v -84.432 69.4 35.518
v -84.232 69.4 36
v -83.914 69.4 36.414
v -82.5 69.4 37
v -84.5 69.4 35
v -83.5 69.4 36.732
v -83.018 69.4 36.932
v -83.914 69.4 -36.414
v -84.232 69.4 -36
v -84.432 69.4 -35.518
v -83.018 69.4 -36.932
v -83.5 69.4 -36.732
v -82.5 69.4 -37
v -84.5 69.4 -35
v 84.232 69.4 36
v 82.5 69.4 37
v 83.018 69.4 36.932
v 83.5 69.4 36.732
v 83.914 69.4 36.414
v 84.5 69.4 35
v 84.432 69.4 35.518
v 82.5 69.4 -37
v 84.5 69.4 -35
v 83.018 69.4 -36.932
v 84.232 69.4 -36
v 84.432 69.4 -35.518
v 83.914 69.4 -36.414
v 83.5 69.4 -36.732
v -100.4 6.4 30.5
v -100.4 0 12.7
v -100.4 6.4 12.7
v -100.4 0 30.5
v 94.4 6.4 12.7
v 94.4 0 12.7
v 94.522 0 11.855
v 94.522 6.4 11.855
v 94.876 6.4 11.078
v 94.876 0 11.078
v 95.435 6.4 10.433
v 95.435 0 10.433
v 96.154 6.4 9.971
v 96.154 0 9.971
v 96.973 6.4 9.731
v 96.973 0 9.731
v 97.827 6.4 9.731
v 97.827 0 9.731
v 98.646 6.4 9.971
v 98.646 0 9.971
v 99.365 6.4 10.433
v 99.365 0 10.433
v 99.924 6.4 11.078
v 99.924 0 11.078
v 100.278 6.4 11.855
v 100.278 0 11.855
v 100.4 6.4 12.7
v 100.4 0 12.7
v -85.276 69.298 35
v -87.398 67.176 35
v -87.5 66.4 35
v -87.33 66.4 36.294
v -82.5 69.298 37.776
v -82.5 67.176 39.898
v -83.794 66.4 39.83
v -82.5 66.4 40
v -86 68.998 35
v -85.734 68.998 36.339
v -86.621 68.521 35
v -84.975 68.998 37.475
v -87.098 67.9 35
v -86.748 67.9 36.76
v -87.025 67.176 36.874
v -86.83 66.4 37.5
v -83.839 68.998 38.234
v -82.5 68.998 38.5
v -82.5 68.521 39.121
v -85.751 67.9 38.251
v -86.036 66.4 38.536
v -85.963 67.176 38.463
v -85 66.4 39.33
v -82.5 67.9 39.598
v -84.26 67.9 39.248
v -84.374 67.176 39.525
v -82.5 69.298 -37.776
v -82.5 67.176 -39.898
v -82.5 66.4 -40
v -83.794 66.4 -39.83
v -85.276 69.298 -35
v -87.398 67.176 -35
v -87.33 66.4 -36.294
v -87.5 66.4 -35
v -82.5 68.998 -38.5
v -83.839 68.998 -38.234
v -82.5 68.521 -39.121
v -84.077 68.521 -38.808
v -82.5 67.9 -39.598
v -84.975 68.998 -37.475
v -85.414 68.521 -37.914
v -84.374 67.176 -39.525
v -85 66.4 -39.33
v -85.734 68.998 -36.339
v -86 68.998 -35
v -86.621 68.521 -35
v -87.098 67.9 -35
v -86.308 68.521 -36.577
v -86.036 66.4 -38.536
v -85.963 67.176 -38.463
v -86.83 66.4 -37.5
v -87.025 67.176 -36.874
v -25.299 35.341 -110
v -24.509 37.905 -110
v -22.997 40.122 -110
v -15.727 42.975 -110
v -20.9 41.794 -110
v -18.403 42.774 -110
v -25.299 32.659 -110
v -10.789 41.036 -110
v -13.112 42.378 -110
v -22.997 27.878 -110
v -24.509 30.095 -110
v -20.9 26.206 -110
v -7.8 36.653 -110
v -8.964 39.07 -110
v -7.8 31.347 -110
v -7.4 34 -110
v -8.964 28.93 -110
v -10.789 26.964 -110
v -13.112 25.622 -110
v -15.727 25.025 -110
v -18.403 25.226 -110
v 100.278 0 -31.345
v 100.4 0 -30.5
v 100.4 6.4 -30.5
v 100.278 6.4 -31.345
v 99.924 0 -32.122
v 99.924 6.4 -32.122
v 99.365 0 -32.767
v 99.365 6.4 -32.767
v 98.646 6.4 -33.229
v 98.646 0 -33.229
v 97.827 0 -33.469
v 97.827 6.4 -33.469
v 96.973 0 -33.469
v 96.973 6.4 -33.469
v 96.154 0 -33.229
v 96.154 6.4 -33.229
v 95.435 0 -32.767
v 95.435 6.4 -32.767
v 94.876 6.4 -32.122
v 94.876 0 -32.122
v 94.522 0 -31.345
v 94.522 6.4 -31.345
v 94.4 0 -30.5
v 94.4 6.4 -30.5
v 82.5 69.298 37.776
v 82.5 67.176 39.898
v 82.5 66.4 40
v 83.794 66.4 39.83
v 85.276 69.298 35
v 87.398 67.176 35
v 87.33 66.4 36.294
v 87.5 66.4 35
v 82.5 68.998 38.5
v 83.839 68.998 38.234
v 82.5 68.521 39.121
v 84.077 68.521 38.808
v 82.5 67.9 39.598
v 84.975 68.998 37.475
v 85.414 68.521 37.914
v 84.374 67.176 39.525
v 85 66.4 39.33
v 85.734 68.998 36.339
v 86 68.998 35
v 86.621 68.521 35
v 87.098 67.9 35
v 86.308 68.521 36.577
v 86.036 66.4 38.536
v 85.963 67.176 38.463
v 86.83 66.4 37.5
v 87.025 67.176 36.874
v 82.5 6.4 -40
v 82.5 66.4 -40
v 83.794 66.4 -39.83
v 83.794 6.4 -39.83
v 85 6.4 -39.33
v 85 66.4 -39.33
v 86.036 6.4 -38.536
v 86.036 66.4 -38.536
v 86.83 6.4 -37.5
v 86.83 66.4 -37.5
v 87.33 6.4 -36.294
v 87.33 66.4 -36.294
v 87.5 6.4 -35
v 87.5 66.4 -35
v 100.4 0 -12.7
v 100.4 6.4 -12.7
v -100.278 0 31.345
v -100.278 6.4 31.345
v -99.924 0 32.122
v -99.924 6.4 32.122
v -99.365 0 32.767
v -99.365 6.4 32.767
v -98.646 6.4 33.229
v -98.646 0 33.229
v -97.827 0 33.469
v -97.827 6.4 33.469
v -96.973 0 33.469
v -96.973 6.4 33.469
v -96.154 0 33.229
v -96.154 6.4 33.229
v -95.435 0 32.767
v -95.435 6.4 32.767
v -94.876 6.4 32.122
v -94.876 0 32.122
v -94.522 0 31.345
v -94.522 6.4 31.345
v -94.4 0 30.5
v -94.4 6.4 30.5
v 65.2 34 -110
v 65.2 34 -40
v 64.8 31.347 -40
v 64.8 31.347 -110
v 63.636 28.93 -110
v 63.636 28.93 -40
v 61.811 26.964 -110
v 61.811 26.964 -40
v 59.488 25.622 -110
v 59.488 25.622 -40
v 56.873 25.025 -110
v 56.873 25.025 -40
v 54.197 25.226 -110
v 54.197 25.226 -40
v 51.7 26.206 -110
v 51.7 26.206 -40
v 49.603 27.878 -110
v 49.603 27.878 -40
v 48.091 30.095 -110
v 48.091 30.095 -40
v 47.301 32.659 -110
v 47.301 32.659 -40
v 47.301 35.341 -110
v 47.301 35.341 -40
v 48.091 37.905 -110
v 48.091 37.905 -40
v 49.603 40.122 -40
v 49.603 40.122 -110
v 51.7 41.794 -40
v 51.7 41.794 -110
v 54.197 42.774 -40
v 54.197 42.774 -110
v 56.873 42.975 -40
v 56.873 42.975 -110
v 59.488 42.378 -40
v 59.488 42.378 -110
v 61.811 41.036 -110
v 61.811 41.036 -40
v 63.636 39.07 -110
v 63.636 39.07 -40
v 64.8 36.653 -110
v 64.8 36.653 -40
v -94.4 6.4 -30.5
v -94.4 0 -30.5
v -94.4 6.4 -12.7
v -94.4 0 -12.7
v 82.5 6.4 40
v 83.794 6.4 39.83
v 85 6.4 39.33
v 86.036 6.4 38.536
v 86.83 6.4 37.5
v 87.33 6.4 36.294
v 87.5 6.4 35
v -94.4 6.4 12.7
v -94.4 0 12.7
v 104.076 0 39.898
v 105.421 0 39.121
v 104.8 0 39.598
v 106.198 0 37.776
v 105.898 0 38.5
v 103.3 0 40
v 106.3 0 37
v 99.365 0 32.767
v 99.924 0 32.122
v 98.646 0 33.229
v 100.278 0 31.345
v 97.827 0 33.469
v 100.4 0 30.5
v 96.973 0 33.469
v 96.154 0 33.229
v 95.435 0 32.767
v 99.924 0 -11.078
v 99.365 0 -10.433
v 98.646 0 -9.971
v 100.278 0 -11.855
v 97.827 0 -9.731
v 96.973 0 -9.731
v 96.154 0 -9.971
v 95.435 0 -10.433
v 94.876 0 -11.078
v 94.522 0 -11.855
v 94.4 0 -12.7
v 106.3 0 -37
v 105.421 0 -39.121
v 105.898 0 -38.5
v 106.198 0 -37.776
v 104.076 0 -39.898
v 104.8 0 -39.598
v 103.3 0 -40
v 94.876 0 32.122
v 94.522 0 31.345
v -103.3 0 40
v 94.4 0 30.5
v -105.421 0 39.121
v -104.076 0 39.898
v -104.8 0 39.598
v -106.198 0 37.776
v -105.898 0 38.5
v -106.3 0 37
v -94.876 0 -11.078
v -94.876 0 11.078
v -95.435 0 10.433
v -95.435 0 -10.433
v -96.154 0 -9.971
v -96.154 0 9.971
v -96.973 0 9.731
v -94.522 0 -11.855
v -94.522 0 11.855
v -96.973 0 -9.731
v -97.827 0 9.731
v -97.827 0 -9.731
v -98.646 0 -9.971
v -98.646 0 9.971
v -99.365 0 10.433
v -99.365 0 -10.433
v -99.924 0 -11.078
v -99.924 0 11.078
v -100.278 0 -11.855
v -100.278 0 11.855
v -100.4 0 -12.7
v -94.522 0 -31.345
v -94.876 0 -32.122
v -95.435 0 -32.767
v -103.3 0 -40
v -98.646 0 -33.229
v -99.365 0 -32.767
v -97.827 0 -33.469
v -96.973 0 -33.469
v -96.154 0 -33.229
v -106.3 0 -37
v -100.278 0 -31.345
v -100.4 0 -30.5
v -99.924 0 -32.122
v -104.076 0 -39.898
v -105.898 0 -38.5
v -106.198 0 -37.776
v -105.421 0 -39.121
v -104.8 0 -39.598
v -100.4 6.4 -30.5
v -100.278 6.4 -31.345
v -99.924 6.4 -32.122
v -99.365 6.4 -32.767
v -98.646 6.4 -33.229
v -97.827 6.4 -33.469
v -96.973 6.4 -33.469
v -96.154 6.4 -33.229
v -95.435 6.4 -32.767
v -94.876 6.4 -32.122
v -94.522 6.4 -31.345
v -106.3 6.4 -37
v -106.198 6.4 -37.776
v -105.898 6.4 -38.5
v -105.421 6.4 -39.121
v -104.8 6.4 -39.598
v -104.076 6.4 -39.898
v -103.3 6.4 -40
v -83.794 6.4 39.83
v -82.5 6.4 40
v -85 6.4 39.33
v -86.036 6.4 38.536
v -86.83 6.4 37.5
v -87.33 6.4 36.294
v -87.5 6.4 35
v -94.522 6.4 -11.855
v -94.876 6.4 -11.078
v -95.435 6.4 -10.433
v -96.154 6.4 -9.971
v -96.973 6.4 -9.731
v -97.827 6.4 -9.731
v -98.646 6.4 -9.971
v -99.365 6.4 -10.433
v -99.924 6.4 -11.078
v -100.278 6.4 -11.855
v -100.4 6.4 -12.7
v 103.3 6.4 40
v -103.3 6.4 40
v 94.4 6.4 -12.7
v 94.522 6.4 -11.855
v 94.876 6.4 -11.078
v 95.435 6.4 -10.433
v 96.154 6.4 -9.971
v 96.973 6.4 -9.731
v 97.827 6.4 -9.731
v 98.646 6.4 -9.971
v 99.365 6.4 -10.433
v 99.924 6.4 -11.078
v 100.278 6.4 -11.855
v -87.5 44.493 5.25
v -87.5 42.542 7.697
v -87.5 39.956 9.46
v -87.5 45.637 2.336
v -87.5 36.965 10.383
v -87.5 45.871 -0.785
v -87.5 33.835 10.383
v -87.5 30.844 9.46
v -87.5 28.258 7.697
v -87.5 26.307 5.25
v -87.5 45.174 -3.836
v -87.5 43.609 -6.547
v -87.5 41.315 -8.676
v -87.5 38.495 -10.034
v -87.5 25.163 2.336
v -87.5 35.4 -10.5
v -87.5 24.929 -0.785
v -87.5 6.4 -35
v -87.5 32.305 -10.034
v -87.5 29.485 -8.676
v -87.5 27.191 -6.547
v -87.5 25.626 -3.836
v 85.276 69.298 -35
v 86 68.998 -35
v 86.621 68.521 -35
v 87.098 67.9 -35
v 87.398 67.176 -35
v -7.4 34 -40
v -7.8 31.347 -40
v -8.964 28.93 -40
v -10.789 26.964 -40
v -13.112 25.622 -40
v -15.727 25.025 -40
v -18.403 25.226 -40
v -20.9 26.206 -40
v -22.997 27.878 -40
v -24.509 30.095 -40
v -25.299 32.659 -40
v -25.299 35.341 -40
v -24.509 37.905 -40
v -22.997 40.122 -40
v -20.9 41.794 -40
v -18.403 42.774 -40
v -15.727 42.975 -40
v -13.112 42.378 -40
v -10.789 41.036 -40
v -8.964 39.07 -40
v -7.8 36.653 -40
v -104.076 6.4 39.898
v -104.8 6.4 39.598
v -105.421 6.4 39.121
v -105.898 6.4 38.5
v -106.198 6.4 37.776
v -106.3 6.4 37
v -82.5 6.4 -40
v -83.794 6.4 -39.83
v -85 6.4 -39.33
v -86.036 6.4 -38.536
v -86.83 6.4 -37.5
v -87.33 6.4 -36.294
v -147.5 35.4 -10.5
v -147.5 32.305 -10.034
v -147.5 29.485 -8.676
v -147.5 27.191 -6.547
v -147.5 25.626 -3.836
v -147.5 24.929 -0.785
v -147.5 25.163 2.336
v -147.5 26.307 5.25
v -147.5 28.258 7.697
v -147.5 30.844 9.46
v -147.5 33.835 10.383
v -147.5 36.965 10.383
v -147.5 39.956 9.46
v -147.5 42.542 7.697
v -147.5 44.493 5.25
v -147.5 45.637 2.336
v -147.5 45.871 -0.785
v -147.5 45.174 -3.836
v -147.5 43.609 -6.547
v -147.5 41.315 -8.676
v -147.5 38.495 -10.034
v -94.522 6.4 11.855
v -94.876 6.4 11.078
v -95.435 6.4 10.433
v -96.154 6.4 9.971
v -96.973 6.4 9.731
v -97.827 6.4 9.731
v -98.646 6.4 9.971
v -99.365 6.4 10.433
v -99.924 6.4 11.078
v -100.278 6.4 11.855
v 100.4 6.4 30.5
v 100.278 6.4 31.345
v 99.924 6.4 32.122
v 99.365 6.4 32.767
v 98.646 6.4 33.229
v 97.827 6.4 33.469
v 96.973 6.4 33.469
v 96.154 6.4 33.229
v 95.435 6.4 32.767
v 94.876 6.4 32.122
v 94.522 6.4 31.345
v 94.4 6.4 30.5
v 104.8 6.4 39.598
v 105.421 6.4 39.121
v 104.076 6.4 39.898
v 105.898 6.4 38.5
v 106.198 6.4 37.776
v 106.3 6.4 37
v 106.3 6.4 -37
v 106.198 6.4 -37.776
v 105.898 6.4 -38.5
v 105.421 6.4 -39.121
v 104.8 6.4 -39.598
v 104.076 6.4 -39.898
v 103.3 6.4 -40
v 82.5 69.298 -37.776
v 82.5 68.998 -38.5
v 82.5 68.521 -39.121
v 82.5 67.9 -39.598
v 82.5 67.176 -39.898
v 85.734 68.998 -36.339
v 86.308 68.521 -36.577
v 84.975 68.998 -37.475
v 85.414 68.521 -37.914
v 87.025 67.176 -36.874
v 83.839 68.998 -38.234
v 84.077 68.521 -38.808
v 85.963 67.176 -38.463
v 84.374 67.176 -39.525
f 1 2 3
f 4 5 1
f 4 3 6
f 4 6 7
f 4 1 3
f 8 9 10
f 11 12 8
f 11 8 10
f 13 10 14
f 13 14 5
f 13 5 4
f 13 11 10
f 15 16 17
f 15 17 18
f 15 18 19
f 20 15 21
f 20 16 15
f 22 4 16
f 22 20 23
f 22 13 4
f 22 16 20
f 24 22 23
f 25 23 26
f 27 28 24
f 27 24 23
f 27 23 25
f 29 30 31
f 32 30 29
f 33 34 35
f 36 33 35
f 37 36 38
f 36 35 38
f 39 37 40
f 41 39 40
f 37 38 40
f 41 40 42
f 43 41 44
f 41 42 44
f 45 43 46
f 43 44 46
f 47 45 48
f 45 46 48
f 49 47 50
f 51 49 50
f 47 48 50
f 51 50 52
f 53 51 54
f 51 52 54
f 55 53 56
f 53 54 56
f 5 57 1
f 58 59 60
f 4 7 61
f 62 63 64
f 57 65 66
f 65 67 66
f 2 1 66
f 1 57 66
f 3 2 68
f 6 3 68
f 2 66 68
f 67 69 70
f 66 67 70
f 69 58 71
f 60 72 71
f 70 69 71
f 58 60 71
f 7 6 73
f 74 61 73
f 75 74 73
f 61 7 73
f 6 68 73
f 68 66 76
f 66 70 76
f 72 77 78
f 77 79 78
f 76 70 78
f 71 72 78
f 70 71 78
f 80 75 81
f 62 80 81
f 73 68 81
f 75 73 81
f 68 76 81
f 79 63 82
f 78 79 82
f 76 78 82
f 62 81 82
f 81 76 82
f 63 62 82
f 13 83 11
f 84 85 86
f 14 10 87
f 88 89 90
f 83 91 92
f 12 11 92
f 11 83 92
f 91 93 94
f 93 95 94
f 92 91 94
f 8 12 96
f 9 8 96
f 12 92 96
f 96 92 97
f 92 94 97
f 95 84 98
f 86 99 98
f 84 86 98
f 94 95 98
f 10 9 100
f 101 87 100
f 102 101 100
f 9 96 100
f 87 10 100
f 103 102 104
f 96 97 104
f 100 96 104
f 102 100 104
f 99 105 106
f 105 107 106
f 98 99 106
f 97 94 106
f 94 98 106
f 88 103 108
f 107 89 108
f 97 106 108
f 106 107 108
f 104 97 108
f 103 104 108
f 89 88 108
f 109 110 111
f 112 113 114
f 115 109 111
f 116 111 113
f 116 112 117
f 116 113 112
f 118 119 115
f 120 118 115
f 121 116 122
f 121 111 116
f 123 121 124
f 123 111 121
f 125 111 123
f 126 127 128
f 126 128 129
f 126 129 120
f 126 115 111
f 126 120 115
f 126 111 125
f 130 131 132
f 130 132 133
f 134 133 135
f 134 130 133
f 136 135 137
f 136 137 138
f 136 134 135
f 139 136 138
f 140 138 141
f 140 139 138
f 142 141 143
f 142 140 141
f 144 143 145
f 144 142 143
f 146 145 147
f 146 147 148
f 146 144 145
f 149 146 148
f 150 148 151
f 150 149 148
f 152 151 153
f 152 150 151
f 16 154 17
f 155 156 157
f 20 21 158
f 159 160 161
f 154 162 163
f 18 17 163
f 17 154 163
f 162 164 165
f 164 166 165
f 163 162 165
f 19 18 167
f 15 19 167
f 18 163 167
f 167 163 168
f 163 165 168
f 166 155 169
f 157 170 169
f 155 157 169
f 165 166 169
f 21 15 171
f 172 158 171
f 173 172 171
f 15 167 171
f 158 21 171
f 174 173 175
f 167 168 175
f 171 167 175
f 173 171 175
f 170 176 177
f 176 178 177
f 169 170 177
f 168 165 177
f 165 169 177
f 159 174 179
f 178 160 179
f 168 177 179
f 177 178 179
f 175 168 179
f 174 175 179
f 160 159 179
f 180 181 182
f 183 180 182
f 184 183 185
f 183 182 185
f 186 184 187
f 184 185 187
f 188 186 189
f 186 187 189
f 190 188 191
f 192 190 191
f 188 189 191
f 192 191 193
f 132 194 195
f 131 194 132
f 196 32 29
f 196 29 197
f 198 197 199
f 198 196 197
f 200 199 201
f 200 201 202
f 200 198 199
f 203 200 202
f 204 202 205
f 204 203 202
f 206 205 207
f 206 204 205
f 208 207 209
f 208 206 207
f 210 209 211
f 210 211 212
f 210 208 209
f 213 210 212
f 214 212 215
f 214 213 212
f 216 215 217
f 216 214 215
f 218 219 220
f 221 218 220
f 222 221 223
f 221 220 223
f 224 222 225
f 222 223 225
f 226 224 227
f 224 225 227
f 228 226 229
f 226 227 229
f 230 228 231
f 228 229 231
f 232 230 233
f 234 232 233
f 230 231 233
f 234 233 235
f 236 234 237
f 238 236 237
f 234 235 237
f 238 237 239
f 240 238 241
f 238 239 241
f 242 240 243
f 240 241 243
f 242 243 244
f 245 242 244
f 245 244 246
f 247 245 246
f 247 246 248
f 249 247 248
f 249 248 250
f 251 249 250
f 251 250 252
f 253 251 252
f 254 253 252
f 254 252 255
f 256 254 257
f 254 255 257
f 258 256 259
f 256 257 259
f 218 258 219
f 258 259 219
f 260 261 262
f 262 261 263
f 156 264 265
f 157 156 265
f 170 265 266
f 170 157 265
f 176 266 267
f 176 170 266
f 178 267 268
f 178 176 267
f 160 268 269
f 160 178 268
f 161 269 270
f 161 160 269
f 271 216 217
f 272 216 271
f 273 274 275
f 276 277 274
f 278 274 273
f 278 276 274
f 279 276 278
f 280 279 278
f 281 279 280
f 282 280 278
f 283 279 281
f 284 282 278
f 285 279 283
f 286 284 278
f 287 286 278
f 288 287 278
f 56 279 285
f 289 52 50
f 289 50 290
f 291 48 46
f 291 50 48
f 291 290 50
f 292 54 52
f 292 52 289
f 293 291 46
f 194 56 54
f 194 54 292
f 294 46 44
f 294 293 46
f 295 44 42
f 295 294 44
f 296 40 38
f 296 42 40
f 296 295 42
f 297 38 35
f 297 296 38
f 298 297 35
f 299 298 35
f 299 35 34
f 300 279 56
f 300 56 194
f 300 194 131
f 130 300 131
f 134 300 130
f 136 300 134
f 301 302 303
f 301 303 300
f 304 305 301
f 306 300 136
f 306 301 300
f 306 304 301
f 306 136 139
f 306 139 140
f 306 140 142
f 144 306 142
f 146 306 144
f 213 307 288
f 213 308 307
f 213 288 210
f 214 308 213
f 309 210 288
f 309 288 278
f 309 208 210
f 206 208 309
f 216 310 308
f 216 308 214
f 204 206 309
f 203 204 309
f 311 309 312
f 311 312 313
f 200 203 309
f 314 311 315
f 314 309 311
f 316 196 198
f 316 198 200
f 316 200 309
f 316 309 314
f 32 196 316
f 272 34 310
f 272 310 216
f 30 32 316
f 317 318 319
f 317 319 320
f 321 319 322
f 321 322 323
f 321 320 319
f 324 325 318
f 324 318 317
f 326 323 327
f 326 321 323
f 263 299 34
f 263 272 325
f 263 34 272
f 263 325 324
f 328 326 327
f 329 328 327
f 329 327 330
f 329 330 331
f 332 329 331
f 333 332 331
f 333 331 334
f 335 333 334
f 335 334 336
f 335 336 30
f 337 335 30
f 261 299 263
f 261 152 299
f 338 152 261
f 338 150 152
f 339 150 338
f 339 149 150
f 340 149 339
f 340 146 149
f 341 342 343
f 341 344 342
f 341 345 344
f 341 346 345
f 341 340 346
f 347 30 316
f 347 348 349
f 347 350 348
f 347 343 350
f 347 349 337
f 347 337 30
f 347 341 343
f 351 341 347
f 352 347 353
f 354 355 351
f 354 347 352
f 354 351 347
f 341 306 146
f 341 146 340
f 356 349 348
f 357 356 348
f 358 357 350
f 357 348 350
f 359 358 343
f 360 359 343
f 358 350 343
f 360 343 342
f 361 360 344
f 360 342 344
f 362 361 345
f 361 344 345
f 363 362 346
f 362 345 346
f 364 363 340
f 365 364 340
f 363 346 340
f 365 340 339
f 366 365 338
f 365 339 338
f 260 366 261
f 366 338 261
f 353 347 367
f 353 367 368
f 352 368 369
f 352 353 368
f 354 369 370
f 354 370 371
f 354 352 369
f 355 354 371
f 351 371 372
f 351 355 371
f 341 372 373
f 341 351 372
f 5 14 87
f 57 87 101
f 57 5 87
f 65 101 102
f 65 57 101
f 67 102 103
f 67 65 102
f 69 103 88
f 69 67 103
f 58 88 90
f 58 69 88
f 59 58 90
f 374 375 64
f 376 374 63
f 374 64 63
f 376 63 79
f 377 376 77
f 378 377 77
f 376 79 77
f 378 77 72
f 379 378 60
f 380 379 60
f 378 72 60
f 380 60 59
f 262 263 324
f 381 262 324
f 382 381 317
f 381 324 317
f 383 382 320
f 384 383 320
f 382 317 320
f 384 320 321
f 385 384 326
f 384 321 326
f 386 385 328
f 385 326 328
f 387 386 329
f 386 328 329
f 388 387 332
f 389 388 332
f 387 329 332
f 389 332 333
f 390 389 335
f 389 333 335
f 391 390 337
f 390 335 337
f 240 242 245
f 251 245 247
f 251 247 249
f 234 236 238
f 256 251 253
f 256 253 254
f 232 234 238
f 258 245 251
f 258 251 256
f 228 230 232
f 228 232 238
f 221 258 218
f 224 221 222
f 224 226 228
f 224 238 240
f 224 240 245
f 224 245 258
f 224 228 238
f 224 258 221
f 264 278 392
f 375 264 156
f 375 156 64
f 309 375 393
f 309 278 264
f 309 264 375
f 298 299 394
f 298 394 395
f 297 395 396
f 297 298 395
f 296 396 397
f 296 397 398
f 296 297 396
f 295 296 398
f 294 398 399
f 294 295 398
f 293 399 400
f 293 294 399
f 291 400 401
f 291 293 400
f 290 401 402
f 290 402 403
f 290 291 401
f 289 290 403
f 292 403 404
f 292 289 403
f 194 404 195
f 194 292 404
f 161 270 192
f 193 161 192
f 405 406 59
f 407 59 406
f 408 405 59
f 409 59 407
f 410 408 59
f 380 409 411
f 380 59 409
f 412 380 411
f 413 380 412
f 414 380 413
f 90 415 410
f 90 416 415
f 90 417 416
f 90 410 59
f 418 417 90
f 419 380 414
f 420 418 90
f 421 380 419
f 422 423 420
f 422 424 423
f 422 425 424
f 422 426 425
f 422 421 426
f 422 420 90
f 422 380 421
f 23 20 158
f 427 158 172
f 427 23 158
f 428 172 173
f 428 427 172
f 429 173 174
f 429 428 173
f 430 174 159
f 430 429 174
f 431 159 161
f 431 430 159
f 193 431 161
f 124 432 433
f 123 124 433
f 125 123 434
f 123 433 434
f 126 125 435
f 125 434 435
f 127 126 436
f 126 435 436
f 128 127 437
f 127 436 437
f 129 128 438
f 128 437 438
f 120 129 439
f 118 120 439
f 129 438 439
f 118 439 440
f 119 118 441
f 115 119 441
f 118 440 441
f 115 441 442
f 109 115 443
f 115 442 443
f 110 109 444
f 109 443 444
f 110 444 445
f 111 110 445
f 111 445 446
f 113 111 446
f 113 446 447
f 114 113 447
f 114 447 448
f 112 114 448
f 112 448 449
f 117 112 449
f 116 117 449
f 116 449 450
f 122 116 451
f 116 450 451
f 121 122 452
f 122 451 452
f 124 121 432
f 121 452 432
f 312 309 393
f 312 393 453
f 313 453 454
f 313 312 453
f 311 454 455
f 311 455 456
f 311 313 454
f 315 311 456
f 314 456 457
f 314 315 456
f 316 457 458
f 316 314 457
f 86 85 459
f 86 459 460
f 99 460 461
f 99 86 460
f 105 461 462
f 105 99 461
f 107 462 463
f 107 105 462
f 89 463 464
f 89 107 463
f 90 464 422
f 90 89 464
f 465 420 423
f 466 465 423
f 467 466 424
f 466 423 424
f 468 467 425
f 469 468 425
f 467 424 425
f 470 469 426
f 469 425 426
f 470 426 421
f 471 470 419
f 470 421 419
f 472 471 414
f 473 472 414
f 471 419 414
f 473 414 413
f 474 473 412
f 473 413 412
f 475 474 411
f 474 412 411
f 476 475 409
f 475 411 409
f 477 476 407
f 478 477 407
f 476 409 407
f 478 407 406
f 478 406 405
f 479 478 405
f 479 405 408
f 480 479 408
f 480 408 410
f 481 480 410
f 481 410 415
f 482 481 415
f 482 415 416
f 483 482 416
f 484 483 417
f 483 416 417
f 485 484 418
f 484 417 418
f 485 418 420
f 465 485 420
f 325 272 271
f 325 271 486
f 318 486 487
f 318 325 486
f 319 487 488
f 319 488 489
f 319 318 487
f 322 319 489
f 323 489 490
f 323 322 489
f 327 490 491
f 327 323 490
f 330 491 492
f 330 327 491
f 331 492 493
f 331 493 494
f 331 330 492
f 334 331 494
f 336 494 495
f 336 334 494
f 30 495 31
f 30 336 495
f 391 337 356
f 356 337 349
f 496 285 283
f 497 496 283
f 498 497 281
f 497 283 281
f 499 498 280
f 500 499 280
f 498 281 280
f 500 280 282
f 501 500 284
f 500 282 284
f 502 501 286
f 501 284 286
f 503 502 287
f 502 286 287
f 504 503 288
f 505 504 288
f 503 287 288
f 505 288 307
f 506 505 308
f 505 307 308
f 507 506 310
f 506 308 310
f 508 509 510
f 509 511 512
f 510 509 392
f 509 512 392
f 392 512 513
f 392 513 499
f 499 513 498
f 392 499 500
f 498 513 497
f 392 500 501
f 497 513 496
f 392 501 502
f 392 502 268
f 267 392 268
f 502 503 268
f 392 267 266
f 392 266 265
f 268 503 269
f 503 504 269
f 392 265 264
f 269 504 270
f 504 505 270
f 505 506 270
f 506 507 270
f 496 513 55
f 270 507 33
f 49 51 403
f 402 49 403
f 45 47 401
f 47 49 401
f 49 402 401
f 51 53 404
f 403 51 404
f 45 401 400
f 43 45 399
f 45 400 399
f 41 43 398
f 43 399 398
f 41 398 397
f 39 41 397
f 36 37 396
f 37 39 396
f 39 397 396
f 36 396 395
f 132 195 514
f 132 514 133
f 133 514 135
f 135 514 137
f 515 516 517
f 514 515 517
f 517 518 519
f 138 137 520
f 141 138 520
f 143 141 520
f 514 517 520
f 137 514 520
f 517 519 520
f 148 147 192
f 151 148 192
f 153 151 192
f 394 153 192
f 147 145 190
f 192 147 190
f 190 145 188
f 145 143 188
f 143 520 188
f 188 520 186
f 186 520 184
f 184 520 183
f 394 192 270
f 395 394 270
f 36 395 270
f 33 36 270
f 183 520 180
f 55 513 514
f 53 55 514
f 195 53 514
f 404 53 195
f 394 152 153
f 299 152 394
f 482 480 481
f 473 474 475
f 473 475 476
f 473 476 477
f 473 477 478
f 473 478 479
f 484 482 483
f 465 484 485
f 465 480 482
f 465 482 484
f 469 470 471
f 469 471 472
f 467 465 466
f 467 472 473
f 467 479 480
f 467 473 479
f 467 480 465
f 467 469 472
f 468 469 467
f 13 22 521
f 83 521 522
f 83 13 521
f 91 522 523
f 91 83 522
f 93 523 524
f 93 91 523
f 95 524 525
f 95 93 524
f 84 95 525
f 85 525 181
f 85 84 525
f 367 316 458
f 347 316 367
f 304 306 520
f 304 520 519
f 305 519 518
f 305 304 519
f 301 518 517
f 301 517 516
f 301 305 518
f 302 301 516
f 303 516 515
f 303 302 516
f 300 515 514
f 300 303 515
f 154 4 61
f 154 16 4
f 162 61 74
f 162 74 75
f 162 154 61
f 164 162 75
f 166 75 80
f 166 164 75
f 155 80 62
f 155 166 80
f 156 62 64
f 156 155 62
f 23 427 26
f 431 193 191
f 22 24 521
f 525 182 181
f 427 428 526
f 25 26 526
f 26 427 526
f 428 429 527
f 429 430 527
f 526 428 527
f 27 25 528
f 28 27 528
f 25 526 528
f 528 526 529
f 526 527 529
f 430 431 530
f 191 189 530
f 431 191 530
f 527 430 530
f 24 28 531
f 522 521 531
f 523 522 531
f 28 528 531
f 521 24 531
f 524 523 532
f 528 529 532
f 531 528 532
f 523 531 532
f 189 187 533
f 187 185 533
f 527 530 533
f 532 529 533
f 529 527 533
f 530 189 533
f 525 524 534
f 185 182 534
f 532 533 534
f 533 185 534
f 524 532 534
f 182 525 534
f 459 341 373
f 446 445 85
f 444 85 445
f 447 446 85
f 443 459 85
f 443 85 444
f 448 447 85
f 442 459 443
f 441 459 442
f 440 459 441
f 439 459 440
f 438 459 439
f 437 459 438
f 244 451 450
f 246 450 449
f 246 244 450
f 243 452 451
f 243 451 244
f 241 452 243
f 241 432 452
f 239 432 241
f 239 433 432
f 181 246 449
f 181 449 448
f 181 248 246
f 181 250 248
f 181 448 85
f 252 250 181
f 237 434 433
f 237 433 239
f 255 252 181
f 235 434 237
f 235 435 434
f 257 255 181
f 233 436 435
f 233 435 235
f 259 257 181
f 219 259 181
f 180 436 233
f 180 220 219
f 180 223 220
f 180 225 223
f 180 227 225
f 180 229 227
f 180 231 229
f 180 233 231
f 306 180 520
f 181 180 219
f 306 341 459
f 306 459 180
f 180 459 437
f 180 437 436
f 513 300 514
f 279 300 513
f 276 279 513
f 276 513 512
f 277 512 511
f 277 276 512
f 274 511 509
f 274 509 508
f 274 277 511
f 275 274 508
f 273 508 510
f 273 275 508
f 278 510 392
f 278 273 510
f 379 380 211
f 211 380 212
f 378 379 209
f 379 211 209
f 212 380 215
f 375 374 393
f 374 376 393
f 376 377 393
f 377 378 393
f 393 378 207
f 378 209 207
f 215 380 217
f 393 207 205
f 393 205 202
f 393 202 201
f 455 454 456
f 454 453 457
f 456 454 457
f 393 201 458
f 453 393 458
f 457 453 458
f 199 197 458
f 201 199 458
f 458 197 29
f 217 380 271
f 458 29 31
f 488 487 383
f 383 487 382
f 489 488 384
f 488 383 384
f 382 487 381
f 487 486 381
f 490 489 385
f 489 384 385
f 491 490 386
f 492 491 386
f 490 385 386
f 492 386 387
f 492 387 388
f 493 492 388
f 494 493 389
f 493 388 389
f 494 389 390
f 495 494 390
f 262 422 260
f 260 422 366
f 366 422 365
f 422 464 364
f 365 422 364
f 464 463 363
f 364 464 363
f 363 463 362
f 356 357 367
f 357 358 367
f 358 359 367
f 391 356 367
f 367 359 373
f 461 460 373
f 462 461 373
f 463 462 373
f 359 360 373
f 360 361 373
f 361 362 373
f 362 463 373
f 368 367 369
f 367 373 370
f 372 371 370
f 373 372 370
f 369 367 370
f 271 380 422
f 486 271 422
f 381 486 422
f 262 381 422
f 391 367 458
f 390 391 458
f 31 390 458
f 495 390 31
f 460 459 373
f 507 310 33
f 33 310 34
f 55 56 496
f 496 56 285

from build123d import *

# Parameters (mm, degrees)
AUFSATZ_LINEAR_AUSTRAGEN1_DEPTH = 6.4
SKIZZE2_W                       = 175
SKIZZE2_H                       = 80
AUFSATZ_LINEAR_AUSTRAGEN2_DEPTH = 63
VERRUNDUNG1_R                   = 5
VERRUNDUNG2_R                   = 3
SKIZZE3_R                       = 9
AUFSATZ_LINEAR_AUSTRAGEN3_DEPTH = 70
SKIZZE4_R                       = 10.5
AUFSATZ_LINEAR_AUSTRAGEN4_DEPTH = 60


with BuildPart() as part:
    # Skizze1 → Aufsatz-Linear austragen1 (new body)
    with BuildSketch(Plane(origin=(0, 0, 0), x_dir=(1, 0, 0), z_dir=(0, 1, 0))):
        with BuildLine():
            Line((-106.3, -37), (-106.3, 37))
            ThreePointArc((-106.3, 37), (-105.421320344, 39.121320344), (-103.3, 40))
            Line((-103.3, 40), (103.3, 40))
            ThreePointArc((103.3, 40), (105.421320344, 39.121320344), (106.3, 37))
            Line((106.3, 37), (106.3, -37))
            ThreePointArc((106.3, -37), (105.421320344, -39.121320344), (103.3, -40))
            Line((103.3, -40), (-103.3, -40))
            ThreePointArc((-103.3, -40), (-105.421320344, -39.121320344), (-106.3, -37))
        make_face()
        with BuildLine():
            Line((-94.4, 30.5), (-94.4, 12.7))
            ThreePointArc((-94.4, 12.7), (-97.4, 9.7), (-100.4, 12.7))
            Line((-100.4, 12.7), (-100.4, 30.5))
            ThreePointArc((-100.4, 30.5), (-97.4, 33.5), (-94.4, 30.5))
        make_face(mode=Mode.SUBTRACT)
        with BuildLine():
            Line((-94.4, -30.5), (-94.4, -12.7))
            ThreePointArc((-94.4, -12.7), (-97.4, -9.7), (-100.4, -12.7))
            Line((-100.4, -12.7), (-100.4, -30.5))
            ThreePointArc((-100.4, -30.5), (-97.4, -33.5), (-94.4, -30.5))
        make_face(mode=Mode.SUBTRACT)
        with BuildLine():
            Line((94.4, 30.5), (94.4, 12.7))
            ThreePointArc((94.4, 12.7), (97.4, 9.7), (100.4, 12.7))
            Line((100.4, 12.7), (100.4, 30.5))
            ThreePointArc((100.4, 30.5), (97.4, 33.5), (94.4, 30.5))
        make_face(mode=Mode.SUBTRACT)
        with BuildLine():
            Line((94.4, -30.5), (94.4, -12.7))
            ThreePointArc((94.4, -12.7), (97.4, -9.7), (100.4, -12.7))
            Line((100.4, -12.7), (100.4, -30.5))
            ThreePointArc((100.4, -30.5), (97.4, -33.5), (94.4, -30.5))
        make_face(mode=Mode.SUBTRACT)
    extrude(amount=AUFSATZ_LINEAR_AUSTRAGEN1_DEPTH)

    # Skizze2 → Aufsatz-Linear austragen2 (add)
    with BuildSketch(Plane(origin=(0, 6.4, 0), x_dir=(1, 0, 0), z_dir=(0, 1, 0))):
        Rectangle(SKIZZE2_W, SKIZZE2_H)
    extrude(amount=AUFSATZ_LINEAR_AUSTRAGEN2_DEPTH)

    # Verrundung1
    verrundung1_edges = [part.edges().sort_by_distance(p)[0] for p in [
        (-87.5, 37.9, 40),
        (87.5, 37.9, 40),
        (87.5, 37.9, -40),
        (-87.5, 37.9, -40),
    ]]
    fillet(verrundung1_edges, radius=VERRUNDUNG1_R)

    # Verrundung2
    verrundung2_edges = [part.edges().sort_by_distance(p)[0] for p in [
        (0, 69.4, 40),
        (-87.5, 69.4, 0),
        (86.035533906, 69.4, 38.535533906),
        (-86.035533906, 69.4, 38.535533906),
        (-86.035533906, 69.4, -38.535533906),
        (86.035533906, 69.4, -38.535533906),
        (0, 69.4, -40),
        (87.5, 69.4, 0),
    ]]
    fillet(verrundung2_edges, radius=VERRUNDUNG2_R)

    # Skizze3 → Aufsatz-Linear austragen3 (add)
    with BuildSketch(Plane(origin=(0, 0, -40), x_dir=(-1, 0, 0), z_dir=(0, 0, -1))):
        with Locations(Location((-56.2, 34, 0), (0, 0, 180))):
            Circle(SKIZZE3_R)
        with Locations(Location((16.4, 34, 0), (0, 0, 180))):
            Circle(SKIZZE3_R)
    extrude(amount=AUFSATZ_LINEAR_AUSTRAGEN3_DEPTH)

    # Skizze4 → Aufsatz-Linear austragen4 (add)
    with BuildSketch(Plane.ZY.offset(87.5)):
        with Locations(Location((0, 35.4, 0), (0, 0, 180))):
            Circle(SKIZZE4_R)
    extrude(amount=AUFSATZ_LINEAR_AUSTRAGEN4_DEPTH)


solid = part.part
